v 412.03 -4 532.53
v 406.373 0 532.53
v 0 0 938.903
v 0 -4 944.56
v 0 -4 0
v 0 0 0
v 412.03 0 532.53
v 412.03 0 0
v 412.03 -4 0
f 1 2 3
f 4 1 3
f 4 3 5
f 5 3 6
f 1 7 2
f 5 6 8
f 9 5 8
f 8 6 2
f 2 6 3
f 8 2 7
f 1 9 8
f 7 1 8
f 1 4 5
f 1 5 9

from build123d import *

# Parameters (mm, degrees)
F1_DEPTH = 4
F2_SIZE  = 3.99999
F4_DEPTH = 25


# Not quite as in the source:
# - a fillet or chamfer is up to 0.001 mm smaller than in the source, because OpenCascade refuses the exact size
# - ends of sketch curves that miss each other by under 0.0002 mm in the source are joined


with BuildPart() as f1:
    # F0 (on Front) → F1 (new body)
    with BuildSketch(Plane.XZ):
        Polygon((0, 944.56), (0, 0), (412.03, 0), (412.03, 532.53), align=None)
    extrude(amount=F1_DEPTH)

    # F2 (size 4 in the source; OpenCascade refuses exactly that, so slightly less here)
    f2_edges = [f1.edges().sort_by_distance(p)[0] for p in [
        (206.015, 0, 738.545),
    ]]
    chamfer(f2_edges, length=F2_SIZE)

    # F3 (on face) → F4 (join)
    with BuildSketch(Plane.YZ.offset(412.03)):
        Polygon((-3.99999, 532.53), (0, 526.8731598926), (0, 532.53), align=None)
    extrude(amount=-F4_DEPTH)


solid = f1.part
